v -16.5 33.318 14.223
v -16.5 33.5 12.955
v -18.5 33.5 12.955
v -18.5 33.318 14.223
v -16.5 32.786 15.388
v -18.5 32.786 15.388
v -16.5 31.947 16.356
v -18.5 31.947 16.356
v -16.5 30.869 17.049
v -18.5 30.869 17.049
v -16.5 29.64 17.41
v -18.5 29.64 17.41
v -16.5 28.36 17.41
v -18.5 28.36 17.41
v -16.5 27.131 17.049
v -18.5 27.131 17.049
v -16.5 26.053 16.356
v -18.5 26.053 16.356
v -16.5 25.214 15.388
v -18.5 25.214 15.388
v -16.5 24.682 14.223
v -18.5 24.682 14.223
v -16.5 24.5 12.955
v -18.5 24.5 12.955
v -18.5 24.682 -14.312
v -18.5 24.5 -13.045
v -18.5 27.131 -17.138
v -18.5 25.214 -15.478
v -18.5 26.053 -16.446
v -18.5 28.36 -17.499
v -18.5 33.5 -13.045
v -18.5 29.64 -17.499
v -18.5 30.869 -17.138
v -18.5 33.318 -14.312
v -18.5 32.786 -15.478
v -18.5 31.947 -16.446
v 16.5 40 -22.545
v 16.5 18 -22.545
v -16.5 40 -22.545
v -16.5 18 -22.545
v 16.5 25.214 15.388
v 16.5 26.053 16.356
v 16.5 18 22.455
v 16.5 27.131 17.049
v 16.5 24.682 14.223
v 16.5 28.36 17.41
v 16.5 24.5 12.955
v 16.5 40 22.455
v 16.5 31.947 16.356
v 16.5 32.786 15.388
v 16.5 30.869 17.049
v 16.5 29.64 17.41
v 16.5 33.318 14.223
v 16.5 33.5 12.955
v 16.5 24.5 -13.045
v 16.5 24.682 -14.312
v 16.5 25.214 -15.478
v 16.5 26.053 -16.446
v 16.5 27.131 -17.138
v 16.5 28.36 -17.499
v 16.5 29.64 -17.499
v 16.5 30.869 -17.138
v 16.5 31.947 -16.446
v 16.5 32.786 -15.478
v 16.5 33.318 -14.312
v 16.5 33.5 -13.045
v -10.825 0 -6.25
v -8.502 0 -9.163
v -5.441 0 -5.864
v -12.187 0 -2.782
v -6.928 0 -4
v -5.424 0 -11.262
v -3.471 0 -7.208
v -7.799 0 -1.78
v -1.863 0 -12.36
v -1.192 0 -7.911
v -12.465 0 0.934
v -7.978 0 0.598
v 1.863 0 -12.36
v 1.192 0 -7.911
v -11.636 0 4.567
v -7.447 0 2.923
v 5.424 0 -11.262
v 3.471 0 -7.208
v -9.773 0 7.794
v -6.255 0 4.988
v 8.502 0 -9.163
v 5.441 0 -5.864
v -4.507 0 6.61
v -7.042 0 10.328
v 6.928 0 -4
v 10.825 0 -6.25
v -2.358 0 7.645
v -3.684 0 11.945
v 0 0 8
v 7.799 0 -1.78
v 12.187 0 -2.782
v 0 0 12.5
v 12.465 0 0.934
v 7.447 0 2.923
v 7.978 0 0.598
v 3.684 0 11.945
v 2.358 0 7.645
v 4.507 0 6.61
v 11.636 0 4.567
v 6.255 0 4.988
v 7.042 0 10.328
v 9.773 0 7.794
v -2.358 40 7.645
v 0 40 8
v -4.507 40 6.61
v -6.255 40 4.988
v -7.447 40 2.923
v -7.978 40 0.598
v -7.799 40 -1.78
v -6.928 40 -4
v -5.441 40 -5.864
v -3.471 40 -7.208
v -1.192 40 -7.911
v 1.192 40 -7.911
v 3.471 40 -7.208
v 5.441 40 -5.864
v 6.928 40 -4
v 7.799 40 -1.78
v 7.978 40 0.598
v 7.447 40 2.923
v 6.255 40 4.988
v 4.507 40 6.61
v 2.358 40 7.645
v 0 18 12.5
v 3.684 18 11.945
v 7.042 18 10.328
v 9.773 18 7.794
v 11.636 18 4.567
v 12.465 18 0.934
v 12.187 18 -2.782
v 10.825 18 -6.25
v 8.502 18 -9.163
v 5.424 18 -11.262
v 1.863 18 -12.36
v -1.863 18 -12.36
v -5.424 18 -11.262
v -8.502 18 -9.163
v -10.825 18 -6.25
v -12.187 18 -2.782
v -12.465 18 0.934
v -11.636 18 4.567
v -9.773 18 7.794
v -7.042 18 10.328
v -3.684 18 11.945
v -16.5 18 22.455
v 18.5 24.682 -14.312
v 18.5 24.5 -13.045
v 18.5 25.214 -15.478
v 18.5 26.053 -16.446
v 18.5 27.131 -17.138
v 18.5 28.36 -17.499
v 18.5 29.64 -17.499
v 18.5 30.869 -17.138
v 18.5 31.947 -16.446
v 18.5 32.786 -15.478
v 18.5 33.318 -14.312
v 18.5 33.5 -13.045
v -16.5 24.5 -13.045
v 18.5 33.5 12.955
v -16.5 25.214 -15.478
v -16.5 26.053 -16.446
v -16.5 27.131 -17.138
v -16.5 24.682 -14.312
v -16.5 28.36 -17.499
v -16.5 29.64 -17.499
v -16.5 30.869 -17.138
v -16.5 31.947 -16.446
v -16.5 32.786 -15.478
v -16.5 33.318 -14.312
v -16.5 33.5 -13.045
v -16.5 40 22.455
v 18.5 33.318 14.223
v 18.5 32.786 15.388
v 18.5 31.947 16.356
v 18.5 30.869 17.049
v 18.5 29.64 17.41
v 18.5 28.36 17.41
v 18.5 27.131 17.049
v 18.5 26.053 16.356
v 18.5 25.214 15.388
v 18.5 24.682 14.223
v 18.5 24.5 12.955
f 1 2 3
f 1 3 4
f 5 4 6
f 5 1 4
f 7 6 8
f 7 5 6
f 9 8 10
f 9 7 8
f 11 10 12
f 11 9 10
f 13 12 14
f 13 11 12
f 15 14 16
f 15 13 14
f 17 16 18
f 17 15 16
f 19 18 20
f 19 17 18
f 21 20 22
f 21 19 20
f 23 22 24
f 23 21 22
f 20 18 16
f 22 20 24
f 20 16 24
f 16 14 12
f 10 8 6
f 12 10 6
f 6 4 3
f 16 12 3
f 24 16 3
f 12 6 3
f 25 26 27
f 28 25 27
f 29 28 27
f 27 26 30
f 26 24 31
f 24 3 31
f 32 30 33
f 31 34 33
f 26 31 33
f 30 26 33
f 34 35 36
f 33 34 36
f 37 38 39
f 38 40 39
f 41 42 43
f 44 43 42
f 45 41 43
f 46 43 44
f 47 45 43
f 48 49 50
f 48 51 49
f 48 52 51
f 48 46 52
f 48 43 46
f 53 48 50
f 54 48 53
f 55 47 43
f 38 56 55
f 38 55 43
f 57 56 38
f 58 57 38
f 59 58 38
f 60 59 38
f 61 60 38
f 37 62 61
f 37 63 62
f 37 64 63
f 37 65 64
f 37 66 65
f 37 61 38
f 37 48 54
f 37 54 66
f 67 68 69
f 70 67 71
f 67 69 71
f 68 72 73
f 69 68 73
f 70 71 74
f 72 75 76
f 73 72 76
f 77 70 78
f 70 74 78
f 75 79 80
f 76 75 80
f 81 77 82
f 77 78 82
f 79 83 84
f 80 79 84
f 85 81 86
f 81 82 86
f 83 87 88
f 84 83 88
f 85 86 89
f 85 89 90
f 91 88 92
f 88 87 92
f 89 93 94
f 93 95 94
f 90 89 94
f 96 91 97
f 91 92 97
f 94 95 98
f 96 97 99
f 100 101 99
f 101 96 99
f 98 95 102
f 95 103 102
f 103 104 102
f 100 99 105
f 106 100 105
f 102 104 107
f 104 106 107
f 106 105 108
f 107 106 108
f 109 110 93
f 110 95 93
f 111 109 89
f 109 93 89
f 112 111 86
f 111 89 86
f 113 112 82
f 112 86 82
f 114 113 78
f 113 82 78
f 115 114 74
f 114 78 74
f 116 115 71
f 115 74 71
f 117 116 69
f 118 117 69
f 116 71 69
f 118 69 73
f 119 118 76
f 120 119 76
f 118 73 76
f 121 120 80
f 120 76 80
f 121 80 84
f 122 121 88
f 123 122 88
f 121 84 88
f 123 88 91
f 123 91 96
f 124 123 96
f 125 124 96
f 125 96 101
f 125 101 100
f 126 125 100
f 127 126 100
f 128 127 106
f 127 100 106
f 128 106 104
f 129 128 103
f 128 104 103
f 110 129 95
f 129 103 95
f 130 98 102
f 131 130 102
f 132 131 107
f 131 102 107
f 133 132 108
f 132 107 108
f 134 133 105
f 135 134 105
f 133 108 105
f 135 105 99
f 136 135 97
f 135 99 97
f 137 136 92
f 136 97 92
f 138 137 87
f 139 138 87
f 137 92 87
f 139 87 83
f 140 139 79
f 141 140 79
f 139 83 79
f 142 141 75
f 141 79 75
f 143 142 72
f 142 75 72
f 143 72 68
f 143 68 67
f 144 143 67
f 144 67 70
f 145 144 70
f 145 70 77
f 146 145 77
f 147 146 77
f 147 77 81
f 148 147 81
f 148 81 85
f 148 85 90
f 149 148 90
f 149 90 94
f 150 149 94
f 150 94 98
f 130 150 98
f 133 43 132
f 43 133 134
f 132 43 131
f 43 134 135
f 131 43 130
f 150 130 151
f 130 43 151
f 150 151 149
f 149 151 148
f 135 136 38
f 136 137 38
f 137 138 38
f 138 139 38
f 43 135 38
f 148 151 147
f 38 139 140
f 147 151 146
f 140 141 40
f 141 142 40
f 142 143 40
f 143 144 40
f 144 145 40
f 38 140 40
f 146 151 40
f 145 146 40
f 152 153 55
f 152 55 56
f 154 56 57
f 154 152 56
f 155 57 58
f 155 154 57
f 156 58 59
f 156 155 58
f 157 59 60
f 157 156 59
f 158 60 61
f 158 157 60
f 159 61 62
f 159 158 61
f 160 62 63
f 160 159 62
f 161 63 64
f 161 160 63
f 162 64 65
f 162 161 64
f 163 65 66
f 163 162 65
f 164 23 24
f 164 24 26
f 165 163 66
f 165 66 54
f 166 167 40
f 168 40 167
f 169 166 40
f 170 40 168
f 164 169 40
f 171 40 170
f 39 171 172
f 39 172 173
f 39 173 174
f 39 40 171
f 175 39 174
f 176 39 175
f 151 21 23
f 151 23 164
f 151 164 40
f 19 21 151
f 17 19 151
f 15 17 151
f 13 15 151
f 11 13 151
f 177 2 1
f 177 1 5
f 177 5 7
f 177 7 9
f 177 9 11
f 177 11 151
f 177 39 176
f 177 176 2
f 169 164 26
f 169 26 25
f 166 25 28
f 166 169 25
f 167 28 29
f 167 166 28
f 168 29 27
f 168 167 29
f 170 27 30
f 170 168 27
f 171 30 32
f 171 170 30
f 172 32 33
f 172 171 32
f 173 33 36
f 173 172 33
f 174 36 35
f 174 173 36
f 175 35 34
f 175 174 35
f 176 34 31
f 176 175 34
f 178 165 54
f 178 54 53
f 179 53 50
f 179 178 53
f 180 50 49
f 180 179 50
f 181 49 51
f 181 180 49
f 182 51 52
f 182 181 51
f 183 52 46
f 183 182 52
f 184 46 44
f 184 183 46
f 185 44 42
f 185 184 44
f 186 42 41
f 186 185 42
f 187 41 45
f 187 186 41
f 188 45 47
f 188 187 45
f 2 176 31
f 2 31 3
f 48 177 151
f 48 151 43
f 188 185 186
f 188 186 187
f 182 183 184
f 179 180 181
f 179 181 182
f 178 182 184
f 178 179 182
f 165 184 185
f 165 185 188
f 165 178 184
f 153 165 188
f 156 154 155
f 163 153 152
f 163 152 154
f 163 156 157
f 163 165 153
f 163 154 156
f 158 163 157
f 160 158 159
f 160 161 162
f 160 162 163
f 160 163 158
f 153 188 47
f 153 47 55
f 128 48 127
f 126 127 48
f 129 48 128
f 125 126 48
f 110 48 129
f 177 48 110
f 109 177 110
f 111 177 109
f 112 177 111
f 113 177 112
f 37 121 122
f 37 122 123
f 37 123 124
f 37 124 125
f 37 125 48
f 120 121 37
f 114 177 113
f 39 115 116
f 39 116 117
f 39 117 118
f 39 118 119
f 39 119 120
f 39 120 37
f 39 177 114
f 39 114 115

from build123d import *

# Parameters (mm, degrees)
ESBO_O1_R                = 12.5
RESSALTO_EXTRUS_O1_DEPTH = 30
ESBO_O2_R                = 8
CORTE_EXTRUS_O1_DEPTH    = 15
ESBO_O3_W                = 3
ESBO_O3_H                = 5
CORTE_EXTRUS_O2_DEPTH    = 6.5
ESBO_O4_R                = 8
CORTE_EXTRUS_O3_DEPTH    = 35.820970693
ESBO_O5_W                = 25
ESBO_O5_H                = 25
RESSALTO_EXTRUS_O2_DEPTH = 12
ESBO_O6_W                = 25
ESBO_O6_H                = 25
RESSALTO_EXTRUS_O3_DEPTH = 10
ESBO_O7_R                = 8
CORTE_EXTRUS_O4_DEPTH    = 29.222331583
ESBO_O8_W                = 45
ESBO_O8_H                = 22
RESSALTO_EXTRUS_O4_DEPTH = 25
ESBO_O9_W                = 45.089311088
ESBO_O9_H                = 22
RESSALTO_EXTRUS_O5_DEPTH = 4
ESBO_O10_W               = 45.089311088
ESBO_O10_H               = 22
RESSALTO_EXTRUS_O6_DEPTH = 4
ESBO_O11_W               = 33
ESBO_O11_H               = 45
RESSALTO_EXTRUS_O7_DEPTH = 22
ESBO_O12_W               = 4
ESBO_O12_H               = 0.089311088
CORTE_EXTRUS_O5_DEPTH    = 49.790485687
RESSALTO_EXTRUS_O8_DEPTH = 2
RESSALTO_EXTRUS_O9_START = 2
RESSALTO_EXTRUS_O9_DEPTH = 2
ESBO_O15_R               = 8
CORTE_EXTRUS_O6_DEPTH    = 37.530966229


with BuildPart() as part:
    # Esboço1 → Ressalto-extrusão1 (new body)
    with BuildSketch(Plane(origin=(0, 0, 0), x_dir=(1, 0, 0), z_dir=(0, 1, 0))):
        with Locations(Location((0, 0, 0), (0, 0, 270))):
            Circle(ESBO_O1_R)
    extrude(amount=RESSALTO_EXTRUS_O1_DEPTH)

    # Esboço2 → Corte-extrusão1 (cut)
    with BuildSketch(Plane(origin=(0, 30, 0), x_dir=(1, 0, 0), z_dir=(0, 1, 0))):
        with Locations(Location((0, 0, 0), (0, 0, 270))):
            Circle(ESBO_O2_R)
    extrude(amount=-CORTE_EXTRUS_O1_DEPTH, mode=Mode.SUBTRACT)

    # Esboço3 → Corte-extrusão2 (cut)
    with BuildSketch(Plane.XZ):
        Rectangle(ESBO_O3_W, ESBO_O3_H)
    extrude(amount=-CORTE_EXTRUS_O2_DEPTH, mode=Mode.SUBTRACT)

    # Esboço4 → Corte-extrusão3 (cut, through all)
    with BuildSketch(Plane(origin=(0, 30, 0), x_dir=(1, 0, 0), z_dir=(0, 1, 0))):
        with Locations(Location((0, 0, 0), (0, 0, 270))):
            Circle(ESBO_O4_R)
    extrude(amount=-CORTE_EXTRUS_O3_DEPTH, mode=Mode.SUBTRACT)

    # Esboço5 → Ressalto-extrusão2 (add)
    with BuildSketch(Plane(origin=(0, 30, 0), x_dir=(1, 0, 0), z_dir=(0, 1, 0))):
        Rectangle(ESBO_O5_W, ESBO_O5_H)
    extrude(amount=-RESSALTO_EXTRUS_O2_DEPTH)

    # Esboço6 → Ressalto-extrusão3 (add)
    with BuildSketch(Plane(origin=(0, 30, 0), x_dir=(1, 0, 0), z_dir=(0, 1, 0))):
        Rectangle(ESBO_O6_W, ESBO_O6_H)
    extrude(amount=RESSALTO_EXTRUS_O3_DEPTH)

    # Esboço7 → Corte-extrusão4 (cut, through all)
    with BuildSketch(Plane.XZ.offset(-18)):
        with Locations(Location((0, 0, 0), (0, 0, 90))):
            Circle(ESBO_O7_R)
    extrude(amount=-CORTE_EXTRUS_O4_DEPTH, mode=Mode.SUBTRACT)

    # Esboço8 → Ressalto-extrusão4 (add)
    with BuildSketch(Plane(origin=(12.5, 0, 0), x_dir=(0, 0, -1), z_dir=(1, 0, 0))):
        with Locations((0.044655544, 29)):
            Rectangle(ESBO_O8_W, ESBO_O8_H)
    extrude(amount=-RESSALTO_EXTRUS_O4_DEPTH)

    # Esboço9 → Ressalto-extrusão5 (add)
    with BuildSketch(Plane.ZY.offset(12.5)):
        with Locations((0, 29)):
            Rectangle(ESBO_O9_W, ESBO_O9_H)
    extrude(amount=RESSALTO_EXTRUS_O5_DEPTH)

    # Esboço10 → Ressalto-extrusão6 (add)
    with BuildSketch(Plane(origin=(12.5, 0, 0), x_dir=(0, 0, -1), z_dir=(1, 0, 0))):
        with Locations((0, 29)):
            Rectangle(ESBO_O10_W, ESBO_O10_H)
    extrude(amount=RESSALTO_EXTRUS_O6_DEPTH)

    # Esboço11 → Ressalto-extrusão7 (add)
    with BuildSketch(Plane(origin=(0, 40, 0), x_dir=(1, 0, 0), z_dir=(0, 1, 0))):
        with Locations((0, 0.044655544)):
            Rectangle(ESBO_O11_W, ESBO_O11_H)
    extrude(amount=-RESSALTO_EXTRUS_O7_DEPTH)

    # Esboço12 → Corte-extrusão5 (cut, through all)
    with BuildSketch(Plane(origin=(0, 40, 0), x_dir=(1, 0, 0), z_dir=(0, 1, 0))):
        with Locations((-14.5, -22.5)):
            Rectangle(ESBO_O12_W, ESBO_O12_H)
        with Locations((14.5, -22.5)):
            Rectangle(ESBO_O12_W, ESBO_O12_H)
    extrude(amount=-CORTE_EXTRUS_O5_DEPTH, mode=Mode.SUBTRACT)

    # Esboço13 → Ressalto-extrusão8 (add)
    with BuildSketch(Plane.ZY.offset(16.5)):
        with BuildLine():
            Line((-13.044655544, 33.5), (12.955344456, 33.5))
            ThreePointArc((12.955344456, 33.5), (17.455344456, 29), (12.955344456, 24.5))
            Line((12.955344456, 24.5), (-13.044655544, 24.5))
            ThreePointArc((-13.044655544, 24.5), (-17.544655544, 29), (-13.044655544, 33.5))
        make_face()
    extrude(amount=RESSALTO_EXTRUS_O8_DEPTH)

    # Esboço14 → Ressalto-extrusão9 (add)
    with BuildSketch(Plane(origin=(16.5, 0, 0), x_dir=(0, 0, -1), z_dir=(1, 0, 0)).offset(RESSALTO_EXTRUS_O9_START)):
        with BuildLine():
            Line((-12.955344456, 24.5), (13.044655544, 24.5))
            ThreePointArc((13.044655544, 24.5), (17.544655544, 29), (13.044655544, 33.5))
            Line((13.044655544, 33.5), (-12.955344456, 33.5))
            ThreePointArc((-12.955344456, 33.5), (-17.455344456, 29), (-12.955344456, 24.5))
        make_face()
    extrude(amount=-RESSALTO_EXTRUS_O9_DEPTH)

    # Esboço15 → Corte-extrusão6 (cut, through all)
    with BuildSketch(Plane.XZ.offset(-18)):
        with Locations(Location((0, 0, 0), (0, 0, 90))):
            Circle(ESBO_O15_R)
    extrude(amount=-CORTE_EXTRUS_O6_DEPTH, mode=Mode.SUBTRACT)


solid = part.part
